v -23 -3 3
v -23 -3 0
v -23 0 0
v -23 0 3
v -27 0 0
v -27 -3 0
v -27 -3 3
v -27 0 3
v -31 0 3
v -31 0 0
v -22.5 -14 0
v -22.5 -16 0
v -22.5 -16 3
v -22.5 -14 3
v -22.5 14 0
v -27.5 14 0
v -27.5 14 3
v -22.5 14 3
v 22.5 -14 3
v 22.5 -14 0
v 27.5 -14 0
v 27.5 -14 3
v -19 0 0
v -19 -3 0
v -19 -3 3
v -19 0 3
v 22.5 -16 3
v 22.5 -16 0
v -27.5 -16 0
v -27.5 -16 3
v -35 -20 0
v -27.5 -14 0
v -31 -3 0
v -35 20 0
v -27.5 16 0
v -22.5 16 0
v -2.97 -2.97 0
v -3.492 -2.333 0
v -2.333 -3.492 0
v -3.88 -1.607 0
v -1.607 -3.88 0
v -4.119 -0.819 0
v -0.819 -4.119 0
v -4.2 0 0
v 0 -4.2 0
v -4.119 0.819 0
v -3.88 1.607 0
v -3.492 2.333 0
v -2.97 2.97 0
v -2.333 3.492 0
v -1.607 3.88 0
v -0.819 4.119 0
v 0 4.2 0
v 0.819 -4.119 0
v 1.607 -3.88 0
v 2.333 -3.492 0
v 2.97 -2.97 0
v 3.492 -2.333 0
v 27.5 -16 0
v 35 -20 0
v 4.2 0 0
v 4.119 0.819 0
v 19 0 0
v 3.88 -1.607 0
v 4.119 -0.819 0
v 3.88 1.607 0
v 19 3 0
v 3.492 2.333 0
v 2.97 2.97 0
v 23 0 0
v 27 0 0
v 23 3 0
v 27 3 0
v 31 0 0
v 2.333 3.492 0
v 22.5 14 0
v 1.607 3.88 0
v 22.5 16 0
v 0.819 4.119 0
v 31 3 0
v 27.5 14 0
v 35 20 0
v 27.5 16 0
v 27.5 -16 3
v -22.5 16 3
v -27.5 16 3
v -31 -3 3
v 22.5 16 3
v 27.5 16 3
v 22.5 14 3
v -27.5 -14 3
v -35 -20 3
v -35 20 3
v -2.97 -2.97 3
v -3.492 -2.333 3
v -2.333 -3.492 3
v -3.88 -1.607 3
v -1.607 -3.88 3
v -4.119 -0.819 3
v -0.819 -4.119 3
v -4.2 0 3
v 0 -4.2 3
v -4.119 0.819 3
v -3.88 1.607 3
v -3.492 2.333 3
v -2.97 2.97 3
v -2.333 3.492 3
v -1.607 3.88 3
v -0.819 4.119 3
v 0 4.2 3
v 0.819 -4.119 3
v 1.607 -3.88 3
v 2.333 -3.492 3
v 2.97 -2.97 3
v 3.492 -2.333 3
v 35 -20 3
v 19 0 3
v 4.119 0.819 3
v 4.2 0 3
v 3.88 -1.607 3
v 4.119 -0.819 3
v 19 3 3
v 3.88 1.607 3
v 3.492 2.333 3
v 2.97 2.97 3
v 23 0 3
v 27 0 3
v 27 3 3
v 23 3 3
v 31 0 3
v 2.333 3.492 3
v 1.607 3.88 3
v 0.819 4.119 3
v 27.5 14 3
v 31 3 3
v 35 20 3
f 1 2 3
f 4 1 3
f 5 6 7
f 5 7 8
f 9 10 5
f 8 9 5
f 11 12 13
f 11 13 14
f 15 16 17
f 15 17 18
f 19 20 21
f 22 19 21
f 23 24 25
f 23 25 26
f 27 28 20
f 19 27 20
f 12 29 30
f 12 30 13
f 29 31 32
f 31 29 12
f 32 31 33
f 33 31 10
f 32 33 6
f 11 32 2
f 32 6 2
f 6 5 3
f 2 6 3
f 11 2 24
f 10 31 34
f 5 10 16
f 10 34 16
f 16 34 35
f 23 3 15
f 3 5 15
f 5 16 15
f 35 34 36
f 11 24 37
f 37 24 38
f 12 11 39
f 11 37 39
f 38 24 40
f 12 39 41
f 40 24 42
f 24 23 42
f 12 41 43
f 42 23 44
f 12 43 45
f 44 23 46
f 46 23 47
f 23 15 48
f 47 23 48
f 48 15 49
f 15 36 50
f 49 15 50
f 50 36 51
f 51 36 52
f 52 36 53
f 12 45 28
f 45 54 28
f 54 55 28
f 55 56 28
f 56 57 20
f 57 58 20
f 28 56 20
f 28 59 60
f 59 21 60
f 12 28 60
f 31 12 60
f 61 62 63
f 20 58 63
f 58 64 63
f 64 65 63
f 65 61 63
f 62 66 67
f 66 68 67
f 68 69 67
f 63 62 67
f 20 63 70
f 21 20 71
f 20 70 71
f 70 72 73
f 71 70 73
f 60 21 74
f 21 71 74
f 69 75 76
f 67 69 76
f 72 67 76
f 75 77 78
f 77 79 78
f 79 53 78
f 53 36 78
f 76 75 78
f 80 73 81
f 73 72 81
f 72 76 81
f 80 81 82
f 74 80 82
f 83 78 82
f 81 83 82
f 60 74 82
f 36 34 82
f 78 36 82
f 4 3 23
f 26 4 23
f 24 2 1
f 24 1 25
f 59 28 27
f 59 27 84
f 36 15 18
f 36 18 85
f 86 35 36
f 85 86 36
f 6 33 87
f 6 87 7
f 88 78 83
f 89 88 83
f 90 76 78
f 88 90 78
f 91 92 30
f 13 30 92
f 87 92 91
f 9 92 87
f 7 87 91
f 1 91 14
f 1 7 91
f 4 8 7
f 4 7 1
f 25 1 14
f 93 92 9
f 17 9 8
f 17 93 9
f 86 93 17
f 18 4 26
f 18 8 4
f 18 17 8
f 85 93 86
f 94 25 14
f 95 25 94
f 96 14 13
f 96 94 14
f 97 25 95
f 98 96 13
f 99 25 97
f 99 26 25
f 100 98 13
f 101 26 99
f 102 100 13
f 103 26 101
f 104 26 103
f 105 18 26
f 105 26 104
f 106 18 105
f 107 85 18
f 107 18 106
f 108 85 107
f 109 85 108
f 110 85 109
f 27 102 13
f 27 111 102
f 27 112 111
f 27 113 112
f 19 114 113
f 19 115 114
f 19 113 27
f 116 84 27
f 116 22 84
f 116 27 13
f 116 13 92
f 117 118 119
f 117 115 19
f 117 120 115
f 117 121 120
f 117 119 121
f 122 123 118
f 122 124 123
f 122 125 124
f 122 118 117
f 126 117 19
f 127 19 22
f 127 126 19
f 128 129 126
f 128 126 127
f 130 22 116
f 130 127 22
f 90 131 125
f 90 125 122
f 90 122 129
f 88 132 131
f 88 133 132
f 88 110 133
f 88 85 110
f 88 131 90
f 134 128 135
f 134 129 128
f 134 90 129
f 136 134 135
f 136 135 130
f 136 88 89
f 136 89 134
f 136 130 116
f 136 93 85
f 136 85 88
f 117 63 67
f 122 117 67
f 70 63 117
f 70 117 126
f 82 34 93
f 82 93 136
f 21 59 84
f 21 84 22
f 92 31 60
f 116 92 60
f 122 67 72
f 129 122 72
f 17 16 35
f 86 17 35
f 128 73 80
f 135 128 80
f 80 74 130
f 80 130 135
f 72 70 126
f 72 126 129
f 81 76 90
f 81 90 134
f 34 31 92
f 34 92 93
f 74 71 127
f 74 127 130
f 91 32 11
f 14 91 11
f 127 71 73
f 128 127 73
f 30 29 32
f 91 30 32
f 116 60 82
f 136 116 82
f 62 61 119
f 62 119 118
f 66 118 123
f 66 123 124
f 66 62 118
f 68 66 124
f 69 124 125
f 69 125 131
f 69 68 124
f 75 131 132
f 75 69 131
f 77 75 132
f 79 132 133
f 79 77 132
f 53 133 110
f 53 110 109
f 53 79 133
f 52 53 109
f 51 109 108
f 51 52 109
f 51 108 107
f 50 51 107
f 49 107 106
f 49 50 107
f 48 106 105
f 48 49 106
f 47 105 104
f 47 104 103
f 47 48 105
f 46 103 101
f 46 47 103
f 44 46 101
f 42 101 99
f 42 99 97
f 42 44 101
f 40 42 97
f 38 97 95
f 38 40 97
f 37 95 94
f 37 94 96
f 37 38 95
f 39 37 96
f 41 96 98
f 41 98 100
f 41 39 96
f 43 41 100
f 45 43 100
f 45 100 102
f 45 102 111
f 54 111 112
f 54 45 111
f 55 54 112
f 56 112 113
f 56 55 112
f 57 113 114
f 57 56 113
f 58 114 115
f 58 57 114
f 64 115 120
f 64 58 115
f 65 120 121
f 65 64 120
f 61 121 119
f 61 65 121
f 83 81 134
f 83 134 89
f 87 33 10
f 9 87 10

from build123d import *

# Parameters (mm, degrees)
SKETCH_W   = 70
SKETCH_H   = 40
SKETCH_R   = 4.2
SKETCH_W_2 = 5
SKETCH_H_2 = 2
SKETCH_W_3 = 4
SKETCH_H_3 = 3
PAD_DEPTH  = 3


with BuildPart() as part:
    # Sketch → Pad (new body)
    with BuildSketch(Plane.XY):
        Rectangle(SKETCH_W, SKETCH_H)
        Circle(SKETCH_R, mode=Mode.SUBTRACT)
        with Locations((-25, 15)):
            Rectangle(SKETCH_W_2, SKETCH_H_2, mode=Mode.SUBTRACT)
        with Locations((25, 15)):
            Rectangle(SKETCH_W_2, SKETCH_H_2, mode=Mode.SUBTRACT)
        with Locations((25, -15)):
            Rectangle(SKETCH_W_2, SKETCH_H_2, mode=Mode.SUBTRACT)
        with Locations((-25, -15)):
            Rectangle(SKETCH_W_2, SKETCH_H_2, mode=Mode.SUBTRACT)
        with Locations((-29, -1.5)):
            Rectangle(SKETCH_W_3, SKETCH_H_3, mode=Mode.SUBTRACT)
        with Locations((-21, -1.5)):
            Rectangle(SKETCH_W_3, SKETCH_H_3, mode=Mode.SUBTRACT)
        with Locations((21, 1.5)):
            Rectangle(SKETCH_W_3, SKETCH_H_3, mode=Mode.SUBTRACT)
        with Locations((29, 1.5)):
            Rectangle(SKETCH_W_3, SKETCH_H_3, mode=Mode.SUBTRACT)
    extrude(amount=PAD_DEPTH)


solid = part.part
